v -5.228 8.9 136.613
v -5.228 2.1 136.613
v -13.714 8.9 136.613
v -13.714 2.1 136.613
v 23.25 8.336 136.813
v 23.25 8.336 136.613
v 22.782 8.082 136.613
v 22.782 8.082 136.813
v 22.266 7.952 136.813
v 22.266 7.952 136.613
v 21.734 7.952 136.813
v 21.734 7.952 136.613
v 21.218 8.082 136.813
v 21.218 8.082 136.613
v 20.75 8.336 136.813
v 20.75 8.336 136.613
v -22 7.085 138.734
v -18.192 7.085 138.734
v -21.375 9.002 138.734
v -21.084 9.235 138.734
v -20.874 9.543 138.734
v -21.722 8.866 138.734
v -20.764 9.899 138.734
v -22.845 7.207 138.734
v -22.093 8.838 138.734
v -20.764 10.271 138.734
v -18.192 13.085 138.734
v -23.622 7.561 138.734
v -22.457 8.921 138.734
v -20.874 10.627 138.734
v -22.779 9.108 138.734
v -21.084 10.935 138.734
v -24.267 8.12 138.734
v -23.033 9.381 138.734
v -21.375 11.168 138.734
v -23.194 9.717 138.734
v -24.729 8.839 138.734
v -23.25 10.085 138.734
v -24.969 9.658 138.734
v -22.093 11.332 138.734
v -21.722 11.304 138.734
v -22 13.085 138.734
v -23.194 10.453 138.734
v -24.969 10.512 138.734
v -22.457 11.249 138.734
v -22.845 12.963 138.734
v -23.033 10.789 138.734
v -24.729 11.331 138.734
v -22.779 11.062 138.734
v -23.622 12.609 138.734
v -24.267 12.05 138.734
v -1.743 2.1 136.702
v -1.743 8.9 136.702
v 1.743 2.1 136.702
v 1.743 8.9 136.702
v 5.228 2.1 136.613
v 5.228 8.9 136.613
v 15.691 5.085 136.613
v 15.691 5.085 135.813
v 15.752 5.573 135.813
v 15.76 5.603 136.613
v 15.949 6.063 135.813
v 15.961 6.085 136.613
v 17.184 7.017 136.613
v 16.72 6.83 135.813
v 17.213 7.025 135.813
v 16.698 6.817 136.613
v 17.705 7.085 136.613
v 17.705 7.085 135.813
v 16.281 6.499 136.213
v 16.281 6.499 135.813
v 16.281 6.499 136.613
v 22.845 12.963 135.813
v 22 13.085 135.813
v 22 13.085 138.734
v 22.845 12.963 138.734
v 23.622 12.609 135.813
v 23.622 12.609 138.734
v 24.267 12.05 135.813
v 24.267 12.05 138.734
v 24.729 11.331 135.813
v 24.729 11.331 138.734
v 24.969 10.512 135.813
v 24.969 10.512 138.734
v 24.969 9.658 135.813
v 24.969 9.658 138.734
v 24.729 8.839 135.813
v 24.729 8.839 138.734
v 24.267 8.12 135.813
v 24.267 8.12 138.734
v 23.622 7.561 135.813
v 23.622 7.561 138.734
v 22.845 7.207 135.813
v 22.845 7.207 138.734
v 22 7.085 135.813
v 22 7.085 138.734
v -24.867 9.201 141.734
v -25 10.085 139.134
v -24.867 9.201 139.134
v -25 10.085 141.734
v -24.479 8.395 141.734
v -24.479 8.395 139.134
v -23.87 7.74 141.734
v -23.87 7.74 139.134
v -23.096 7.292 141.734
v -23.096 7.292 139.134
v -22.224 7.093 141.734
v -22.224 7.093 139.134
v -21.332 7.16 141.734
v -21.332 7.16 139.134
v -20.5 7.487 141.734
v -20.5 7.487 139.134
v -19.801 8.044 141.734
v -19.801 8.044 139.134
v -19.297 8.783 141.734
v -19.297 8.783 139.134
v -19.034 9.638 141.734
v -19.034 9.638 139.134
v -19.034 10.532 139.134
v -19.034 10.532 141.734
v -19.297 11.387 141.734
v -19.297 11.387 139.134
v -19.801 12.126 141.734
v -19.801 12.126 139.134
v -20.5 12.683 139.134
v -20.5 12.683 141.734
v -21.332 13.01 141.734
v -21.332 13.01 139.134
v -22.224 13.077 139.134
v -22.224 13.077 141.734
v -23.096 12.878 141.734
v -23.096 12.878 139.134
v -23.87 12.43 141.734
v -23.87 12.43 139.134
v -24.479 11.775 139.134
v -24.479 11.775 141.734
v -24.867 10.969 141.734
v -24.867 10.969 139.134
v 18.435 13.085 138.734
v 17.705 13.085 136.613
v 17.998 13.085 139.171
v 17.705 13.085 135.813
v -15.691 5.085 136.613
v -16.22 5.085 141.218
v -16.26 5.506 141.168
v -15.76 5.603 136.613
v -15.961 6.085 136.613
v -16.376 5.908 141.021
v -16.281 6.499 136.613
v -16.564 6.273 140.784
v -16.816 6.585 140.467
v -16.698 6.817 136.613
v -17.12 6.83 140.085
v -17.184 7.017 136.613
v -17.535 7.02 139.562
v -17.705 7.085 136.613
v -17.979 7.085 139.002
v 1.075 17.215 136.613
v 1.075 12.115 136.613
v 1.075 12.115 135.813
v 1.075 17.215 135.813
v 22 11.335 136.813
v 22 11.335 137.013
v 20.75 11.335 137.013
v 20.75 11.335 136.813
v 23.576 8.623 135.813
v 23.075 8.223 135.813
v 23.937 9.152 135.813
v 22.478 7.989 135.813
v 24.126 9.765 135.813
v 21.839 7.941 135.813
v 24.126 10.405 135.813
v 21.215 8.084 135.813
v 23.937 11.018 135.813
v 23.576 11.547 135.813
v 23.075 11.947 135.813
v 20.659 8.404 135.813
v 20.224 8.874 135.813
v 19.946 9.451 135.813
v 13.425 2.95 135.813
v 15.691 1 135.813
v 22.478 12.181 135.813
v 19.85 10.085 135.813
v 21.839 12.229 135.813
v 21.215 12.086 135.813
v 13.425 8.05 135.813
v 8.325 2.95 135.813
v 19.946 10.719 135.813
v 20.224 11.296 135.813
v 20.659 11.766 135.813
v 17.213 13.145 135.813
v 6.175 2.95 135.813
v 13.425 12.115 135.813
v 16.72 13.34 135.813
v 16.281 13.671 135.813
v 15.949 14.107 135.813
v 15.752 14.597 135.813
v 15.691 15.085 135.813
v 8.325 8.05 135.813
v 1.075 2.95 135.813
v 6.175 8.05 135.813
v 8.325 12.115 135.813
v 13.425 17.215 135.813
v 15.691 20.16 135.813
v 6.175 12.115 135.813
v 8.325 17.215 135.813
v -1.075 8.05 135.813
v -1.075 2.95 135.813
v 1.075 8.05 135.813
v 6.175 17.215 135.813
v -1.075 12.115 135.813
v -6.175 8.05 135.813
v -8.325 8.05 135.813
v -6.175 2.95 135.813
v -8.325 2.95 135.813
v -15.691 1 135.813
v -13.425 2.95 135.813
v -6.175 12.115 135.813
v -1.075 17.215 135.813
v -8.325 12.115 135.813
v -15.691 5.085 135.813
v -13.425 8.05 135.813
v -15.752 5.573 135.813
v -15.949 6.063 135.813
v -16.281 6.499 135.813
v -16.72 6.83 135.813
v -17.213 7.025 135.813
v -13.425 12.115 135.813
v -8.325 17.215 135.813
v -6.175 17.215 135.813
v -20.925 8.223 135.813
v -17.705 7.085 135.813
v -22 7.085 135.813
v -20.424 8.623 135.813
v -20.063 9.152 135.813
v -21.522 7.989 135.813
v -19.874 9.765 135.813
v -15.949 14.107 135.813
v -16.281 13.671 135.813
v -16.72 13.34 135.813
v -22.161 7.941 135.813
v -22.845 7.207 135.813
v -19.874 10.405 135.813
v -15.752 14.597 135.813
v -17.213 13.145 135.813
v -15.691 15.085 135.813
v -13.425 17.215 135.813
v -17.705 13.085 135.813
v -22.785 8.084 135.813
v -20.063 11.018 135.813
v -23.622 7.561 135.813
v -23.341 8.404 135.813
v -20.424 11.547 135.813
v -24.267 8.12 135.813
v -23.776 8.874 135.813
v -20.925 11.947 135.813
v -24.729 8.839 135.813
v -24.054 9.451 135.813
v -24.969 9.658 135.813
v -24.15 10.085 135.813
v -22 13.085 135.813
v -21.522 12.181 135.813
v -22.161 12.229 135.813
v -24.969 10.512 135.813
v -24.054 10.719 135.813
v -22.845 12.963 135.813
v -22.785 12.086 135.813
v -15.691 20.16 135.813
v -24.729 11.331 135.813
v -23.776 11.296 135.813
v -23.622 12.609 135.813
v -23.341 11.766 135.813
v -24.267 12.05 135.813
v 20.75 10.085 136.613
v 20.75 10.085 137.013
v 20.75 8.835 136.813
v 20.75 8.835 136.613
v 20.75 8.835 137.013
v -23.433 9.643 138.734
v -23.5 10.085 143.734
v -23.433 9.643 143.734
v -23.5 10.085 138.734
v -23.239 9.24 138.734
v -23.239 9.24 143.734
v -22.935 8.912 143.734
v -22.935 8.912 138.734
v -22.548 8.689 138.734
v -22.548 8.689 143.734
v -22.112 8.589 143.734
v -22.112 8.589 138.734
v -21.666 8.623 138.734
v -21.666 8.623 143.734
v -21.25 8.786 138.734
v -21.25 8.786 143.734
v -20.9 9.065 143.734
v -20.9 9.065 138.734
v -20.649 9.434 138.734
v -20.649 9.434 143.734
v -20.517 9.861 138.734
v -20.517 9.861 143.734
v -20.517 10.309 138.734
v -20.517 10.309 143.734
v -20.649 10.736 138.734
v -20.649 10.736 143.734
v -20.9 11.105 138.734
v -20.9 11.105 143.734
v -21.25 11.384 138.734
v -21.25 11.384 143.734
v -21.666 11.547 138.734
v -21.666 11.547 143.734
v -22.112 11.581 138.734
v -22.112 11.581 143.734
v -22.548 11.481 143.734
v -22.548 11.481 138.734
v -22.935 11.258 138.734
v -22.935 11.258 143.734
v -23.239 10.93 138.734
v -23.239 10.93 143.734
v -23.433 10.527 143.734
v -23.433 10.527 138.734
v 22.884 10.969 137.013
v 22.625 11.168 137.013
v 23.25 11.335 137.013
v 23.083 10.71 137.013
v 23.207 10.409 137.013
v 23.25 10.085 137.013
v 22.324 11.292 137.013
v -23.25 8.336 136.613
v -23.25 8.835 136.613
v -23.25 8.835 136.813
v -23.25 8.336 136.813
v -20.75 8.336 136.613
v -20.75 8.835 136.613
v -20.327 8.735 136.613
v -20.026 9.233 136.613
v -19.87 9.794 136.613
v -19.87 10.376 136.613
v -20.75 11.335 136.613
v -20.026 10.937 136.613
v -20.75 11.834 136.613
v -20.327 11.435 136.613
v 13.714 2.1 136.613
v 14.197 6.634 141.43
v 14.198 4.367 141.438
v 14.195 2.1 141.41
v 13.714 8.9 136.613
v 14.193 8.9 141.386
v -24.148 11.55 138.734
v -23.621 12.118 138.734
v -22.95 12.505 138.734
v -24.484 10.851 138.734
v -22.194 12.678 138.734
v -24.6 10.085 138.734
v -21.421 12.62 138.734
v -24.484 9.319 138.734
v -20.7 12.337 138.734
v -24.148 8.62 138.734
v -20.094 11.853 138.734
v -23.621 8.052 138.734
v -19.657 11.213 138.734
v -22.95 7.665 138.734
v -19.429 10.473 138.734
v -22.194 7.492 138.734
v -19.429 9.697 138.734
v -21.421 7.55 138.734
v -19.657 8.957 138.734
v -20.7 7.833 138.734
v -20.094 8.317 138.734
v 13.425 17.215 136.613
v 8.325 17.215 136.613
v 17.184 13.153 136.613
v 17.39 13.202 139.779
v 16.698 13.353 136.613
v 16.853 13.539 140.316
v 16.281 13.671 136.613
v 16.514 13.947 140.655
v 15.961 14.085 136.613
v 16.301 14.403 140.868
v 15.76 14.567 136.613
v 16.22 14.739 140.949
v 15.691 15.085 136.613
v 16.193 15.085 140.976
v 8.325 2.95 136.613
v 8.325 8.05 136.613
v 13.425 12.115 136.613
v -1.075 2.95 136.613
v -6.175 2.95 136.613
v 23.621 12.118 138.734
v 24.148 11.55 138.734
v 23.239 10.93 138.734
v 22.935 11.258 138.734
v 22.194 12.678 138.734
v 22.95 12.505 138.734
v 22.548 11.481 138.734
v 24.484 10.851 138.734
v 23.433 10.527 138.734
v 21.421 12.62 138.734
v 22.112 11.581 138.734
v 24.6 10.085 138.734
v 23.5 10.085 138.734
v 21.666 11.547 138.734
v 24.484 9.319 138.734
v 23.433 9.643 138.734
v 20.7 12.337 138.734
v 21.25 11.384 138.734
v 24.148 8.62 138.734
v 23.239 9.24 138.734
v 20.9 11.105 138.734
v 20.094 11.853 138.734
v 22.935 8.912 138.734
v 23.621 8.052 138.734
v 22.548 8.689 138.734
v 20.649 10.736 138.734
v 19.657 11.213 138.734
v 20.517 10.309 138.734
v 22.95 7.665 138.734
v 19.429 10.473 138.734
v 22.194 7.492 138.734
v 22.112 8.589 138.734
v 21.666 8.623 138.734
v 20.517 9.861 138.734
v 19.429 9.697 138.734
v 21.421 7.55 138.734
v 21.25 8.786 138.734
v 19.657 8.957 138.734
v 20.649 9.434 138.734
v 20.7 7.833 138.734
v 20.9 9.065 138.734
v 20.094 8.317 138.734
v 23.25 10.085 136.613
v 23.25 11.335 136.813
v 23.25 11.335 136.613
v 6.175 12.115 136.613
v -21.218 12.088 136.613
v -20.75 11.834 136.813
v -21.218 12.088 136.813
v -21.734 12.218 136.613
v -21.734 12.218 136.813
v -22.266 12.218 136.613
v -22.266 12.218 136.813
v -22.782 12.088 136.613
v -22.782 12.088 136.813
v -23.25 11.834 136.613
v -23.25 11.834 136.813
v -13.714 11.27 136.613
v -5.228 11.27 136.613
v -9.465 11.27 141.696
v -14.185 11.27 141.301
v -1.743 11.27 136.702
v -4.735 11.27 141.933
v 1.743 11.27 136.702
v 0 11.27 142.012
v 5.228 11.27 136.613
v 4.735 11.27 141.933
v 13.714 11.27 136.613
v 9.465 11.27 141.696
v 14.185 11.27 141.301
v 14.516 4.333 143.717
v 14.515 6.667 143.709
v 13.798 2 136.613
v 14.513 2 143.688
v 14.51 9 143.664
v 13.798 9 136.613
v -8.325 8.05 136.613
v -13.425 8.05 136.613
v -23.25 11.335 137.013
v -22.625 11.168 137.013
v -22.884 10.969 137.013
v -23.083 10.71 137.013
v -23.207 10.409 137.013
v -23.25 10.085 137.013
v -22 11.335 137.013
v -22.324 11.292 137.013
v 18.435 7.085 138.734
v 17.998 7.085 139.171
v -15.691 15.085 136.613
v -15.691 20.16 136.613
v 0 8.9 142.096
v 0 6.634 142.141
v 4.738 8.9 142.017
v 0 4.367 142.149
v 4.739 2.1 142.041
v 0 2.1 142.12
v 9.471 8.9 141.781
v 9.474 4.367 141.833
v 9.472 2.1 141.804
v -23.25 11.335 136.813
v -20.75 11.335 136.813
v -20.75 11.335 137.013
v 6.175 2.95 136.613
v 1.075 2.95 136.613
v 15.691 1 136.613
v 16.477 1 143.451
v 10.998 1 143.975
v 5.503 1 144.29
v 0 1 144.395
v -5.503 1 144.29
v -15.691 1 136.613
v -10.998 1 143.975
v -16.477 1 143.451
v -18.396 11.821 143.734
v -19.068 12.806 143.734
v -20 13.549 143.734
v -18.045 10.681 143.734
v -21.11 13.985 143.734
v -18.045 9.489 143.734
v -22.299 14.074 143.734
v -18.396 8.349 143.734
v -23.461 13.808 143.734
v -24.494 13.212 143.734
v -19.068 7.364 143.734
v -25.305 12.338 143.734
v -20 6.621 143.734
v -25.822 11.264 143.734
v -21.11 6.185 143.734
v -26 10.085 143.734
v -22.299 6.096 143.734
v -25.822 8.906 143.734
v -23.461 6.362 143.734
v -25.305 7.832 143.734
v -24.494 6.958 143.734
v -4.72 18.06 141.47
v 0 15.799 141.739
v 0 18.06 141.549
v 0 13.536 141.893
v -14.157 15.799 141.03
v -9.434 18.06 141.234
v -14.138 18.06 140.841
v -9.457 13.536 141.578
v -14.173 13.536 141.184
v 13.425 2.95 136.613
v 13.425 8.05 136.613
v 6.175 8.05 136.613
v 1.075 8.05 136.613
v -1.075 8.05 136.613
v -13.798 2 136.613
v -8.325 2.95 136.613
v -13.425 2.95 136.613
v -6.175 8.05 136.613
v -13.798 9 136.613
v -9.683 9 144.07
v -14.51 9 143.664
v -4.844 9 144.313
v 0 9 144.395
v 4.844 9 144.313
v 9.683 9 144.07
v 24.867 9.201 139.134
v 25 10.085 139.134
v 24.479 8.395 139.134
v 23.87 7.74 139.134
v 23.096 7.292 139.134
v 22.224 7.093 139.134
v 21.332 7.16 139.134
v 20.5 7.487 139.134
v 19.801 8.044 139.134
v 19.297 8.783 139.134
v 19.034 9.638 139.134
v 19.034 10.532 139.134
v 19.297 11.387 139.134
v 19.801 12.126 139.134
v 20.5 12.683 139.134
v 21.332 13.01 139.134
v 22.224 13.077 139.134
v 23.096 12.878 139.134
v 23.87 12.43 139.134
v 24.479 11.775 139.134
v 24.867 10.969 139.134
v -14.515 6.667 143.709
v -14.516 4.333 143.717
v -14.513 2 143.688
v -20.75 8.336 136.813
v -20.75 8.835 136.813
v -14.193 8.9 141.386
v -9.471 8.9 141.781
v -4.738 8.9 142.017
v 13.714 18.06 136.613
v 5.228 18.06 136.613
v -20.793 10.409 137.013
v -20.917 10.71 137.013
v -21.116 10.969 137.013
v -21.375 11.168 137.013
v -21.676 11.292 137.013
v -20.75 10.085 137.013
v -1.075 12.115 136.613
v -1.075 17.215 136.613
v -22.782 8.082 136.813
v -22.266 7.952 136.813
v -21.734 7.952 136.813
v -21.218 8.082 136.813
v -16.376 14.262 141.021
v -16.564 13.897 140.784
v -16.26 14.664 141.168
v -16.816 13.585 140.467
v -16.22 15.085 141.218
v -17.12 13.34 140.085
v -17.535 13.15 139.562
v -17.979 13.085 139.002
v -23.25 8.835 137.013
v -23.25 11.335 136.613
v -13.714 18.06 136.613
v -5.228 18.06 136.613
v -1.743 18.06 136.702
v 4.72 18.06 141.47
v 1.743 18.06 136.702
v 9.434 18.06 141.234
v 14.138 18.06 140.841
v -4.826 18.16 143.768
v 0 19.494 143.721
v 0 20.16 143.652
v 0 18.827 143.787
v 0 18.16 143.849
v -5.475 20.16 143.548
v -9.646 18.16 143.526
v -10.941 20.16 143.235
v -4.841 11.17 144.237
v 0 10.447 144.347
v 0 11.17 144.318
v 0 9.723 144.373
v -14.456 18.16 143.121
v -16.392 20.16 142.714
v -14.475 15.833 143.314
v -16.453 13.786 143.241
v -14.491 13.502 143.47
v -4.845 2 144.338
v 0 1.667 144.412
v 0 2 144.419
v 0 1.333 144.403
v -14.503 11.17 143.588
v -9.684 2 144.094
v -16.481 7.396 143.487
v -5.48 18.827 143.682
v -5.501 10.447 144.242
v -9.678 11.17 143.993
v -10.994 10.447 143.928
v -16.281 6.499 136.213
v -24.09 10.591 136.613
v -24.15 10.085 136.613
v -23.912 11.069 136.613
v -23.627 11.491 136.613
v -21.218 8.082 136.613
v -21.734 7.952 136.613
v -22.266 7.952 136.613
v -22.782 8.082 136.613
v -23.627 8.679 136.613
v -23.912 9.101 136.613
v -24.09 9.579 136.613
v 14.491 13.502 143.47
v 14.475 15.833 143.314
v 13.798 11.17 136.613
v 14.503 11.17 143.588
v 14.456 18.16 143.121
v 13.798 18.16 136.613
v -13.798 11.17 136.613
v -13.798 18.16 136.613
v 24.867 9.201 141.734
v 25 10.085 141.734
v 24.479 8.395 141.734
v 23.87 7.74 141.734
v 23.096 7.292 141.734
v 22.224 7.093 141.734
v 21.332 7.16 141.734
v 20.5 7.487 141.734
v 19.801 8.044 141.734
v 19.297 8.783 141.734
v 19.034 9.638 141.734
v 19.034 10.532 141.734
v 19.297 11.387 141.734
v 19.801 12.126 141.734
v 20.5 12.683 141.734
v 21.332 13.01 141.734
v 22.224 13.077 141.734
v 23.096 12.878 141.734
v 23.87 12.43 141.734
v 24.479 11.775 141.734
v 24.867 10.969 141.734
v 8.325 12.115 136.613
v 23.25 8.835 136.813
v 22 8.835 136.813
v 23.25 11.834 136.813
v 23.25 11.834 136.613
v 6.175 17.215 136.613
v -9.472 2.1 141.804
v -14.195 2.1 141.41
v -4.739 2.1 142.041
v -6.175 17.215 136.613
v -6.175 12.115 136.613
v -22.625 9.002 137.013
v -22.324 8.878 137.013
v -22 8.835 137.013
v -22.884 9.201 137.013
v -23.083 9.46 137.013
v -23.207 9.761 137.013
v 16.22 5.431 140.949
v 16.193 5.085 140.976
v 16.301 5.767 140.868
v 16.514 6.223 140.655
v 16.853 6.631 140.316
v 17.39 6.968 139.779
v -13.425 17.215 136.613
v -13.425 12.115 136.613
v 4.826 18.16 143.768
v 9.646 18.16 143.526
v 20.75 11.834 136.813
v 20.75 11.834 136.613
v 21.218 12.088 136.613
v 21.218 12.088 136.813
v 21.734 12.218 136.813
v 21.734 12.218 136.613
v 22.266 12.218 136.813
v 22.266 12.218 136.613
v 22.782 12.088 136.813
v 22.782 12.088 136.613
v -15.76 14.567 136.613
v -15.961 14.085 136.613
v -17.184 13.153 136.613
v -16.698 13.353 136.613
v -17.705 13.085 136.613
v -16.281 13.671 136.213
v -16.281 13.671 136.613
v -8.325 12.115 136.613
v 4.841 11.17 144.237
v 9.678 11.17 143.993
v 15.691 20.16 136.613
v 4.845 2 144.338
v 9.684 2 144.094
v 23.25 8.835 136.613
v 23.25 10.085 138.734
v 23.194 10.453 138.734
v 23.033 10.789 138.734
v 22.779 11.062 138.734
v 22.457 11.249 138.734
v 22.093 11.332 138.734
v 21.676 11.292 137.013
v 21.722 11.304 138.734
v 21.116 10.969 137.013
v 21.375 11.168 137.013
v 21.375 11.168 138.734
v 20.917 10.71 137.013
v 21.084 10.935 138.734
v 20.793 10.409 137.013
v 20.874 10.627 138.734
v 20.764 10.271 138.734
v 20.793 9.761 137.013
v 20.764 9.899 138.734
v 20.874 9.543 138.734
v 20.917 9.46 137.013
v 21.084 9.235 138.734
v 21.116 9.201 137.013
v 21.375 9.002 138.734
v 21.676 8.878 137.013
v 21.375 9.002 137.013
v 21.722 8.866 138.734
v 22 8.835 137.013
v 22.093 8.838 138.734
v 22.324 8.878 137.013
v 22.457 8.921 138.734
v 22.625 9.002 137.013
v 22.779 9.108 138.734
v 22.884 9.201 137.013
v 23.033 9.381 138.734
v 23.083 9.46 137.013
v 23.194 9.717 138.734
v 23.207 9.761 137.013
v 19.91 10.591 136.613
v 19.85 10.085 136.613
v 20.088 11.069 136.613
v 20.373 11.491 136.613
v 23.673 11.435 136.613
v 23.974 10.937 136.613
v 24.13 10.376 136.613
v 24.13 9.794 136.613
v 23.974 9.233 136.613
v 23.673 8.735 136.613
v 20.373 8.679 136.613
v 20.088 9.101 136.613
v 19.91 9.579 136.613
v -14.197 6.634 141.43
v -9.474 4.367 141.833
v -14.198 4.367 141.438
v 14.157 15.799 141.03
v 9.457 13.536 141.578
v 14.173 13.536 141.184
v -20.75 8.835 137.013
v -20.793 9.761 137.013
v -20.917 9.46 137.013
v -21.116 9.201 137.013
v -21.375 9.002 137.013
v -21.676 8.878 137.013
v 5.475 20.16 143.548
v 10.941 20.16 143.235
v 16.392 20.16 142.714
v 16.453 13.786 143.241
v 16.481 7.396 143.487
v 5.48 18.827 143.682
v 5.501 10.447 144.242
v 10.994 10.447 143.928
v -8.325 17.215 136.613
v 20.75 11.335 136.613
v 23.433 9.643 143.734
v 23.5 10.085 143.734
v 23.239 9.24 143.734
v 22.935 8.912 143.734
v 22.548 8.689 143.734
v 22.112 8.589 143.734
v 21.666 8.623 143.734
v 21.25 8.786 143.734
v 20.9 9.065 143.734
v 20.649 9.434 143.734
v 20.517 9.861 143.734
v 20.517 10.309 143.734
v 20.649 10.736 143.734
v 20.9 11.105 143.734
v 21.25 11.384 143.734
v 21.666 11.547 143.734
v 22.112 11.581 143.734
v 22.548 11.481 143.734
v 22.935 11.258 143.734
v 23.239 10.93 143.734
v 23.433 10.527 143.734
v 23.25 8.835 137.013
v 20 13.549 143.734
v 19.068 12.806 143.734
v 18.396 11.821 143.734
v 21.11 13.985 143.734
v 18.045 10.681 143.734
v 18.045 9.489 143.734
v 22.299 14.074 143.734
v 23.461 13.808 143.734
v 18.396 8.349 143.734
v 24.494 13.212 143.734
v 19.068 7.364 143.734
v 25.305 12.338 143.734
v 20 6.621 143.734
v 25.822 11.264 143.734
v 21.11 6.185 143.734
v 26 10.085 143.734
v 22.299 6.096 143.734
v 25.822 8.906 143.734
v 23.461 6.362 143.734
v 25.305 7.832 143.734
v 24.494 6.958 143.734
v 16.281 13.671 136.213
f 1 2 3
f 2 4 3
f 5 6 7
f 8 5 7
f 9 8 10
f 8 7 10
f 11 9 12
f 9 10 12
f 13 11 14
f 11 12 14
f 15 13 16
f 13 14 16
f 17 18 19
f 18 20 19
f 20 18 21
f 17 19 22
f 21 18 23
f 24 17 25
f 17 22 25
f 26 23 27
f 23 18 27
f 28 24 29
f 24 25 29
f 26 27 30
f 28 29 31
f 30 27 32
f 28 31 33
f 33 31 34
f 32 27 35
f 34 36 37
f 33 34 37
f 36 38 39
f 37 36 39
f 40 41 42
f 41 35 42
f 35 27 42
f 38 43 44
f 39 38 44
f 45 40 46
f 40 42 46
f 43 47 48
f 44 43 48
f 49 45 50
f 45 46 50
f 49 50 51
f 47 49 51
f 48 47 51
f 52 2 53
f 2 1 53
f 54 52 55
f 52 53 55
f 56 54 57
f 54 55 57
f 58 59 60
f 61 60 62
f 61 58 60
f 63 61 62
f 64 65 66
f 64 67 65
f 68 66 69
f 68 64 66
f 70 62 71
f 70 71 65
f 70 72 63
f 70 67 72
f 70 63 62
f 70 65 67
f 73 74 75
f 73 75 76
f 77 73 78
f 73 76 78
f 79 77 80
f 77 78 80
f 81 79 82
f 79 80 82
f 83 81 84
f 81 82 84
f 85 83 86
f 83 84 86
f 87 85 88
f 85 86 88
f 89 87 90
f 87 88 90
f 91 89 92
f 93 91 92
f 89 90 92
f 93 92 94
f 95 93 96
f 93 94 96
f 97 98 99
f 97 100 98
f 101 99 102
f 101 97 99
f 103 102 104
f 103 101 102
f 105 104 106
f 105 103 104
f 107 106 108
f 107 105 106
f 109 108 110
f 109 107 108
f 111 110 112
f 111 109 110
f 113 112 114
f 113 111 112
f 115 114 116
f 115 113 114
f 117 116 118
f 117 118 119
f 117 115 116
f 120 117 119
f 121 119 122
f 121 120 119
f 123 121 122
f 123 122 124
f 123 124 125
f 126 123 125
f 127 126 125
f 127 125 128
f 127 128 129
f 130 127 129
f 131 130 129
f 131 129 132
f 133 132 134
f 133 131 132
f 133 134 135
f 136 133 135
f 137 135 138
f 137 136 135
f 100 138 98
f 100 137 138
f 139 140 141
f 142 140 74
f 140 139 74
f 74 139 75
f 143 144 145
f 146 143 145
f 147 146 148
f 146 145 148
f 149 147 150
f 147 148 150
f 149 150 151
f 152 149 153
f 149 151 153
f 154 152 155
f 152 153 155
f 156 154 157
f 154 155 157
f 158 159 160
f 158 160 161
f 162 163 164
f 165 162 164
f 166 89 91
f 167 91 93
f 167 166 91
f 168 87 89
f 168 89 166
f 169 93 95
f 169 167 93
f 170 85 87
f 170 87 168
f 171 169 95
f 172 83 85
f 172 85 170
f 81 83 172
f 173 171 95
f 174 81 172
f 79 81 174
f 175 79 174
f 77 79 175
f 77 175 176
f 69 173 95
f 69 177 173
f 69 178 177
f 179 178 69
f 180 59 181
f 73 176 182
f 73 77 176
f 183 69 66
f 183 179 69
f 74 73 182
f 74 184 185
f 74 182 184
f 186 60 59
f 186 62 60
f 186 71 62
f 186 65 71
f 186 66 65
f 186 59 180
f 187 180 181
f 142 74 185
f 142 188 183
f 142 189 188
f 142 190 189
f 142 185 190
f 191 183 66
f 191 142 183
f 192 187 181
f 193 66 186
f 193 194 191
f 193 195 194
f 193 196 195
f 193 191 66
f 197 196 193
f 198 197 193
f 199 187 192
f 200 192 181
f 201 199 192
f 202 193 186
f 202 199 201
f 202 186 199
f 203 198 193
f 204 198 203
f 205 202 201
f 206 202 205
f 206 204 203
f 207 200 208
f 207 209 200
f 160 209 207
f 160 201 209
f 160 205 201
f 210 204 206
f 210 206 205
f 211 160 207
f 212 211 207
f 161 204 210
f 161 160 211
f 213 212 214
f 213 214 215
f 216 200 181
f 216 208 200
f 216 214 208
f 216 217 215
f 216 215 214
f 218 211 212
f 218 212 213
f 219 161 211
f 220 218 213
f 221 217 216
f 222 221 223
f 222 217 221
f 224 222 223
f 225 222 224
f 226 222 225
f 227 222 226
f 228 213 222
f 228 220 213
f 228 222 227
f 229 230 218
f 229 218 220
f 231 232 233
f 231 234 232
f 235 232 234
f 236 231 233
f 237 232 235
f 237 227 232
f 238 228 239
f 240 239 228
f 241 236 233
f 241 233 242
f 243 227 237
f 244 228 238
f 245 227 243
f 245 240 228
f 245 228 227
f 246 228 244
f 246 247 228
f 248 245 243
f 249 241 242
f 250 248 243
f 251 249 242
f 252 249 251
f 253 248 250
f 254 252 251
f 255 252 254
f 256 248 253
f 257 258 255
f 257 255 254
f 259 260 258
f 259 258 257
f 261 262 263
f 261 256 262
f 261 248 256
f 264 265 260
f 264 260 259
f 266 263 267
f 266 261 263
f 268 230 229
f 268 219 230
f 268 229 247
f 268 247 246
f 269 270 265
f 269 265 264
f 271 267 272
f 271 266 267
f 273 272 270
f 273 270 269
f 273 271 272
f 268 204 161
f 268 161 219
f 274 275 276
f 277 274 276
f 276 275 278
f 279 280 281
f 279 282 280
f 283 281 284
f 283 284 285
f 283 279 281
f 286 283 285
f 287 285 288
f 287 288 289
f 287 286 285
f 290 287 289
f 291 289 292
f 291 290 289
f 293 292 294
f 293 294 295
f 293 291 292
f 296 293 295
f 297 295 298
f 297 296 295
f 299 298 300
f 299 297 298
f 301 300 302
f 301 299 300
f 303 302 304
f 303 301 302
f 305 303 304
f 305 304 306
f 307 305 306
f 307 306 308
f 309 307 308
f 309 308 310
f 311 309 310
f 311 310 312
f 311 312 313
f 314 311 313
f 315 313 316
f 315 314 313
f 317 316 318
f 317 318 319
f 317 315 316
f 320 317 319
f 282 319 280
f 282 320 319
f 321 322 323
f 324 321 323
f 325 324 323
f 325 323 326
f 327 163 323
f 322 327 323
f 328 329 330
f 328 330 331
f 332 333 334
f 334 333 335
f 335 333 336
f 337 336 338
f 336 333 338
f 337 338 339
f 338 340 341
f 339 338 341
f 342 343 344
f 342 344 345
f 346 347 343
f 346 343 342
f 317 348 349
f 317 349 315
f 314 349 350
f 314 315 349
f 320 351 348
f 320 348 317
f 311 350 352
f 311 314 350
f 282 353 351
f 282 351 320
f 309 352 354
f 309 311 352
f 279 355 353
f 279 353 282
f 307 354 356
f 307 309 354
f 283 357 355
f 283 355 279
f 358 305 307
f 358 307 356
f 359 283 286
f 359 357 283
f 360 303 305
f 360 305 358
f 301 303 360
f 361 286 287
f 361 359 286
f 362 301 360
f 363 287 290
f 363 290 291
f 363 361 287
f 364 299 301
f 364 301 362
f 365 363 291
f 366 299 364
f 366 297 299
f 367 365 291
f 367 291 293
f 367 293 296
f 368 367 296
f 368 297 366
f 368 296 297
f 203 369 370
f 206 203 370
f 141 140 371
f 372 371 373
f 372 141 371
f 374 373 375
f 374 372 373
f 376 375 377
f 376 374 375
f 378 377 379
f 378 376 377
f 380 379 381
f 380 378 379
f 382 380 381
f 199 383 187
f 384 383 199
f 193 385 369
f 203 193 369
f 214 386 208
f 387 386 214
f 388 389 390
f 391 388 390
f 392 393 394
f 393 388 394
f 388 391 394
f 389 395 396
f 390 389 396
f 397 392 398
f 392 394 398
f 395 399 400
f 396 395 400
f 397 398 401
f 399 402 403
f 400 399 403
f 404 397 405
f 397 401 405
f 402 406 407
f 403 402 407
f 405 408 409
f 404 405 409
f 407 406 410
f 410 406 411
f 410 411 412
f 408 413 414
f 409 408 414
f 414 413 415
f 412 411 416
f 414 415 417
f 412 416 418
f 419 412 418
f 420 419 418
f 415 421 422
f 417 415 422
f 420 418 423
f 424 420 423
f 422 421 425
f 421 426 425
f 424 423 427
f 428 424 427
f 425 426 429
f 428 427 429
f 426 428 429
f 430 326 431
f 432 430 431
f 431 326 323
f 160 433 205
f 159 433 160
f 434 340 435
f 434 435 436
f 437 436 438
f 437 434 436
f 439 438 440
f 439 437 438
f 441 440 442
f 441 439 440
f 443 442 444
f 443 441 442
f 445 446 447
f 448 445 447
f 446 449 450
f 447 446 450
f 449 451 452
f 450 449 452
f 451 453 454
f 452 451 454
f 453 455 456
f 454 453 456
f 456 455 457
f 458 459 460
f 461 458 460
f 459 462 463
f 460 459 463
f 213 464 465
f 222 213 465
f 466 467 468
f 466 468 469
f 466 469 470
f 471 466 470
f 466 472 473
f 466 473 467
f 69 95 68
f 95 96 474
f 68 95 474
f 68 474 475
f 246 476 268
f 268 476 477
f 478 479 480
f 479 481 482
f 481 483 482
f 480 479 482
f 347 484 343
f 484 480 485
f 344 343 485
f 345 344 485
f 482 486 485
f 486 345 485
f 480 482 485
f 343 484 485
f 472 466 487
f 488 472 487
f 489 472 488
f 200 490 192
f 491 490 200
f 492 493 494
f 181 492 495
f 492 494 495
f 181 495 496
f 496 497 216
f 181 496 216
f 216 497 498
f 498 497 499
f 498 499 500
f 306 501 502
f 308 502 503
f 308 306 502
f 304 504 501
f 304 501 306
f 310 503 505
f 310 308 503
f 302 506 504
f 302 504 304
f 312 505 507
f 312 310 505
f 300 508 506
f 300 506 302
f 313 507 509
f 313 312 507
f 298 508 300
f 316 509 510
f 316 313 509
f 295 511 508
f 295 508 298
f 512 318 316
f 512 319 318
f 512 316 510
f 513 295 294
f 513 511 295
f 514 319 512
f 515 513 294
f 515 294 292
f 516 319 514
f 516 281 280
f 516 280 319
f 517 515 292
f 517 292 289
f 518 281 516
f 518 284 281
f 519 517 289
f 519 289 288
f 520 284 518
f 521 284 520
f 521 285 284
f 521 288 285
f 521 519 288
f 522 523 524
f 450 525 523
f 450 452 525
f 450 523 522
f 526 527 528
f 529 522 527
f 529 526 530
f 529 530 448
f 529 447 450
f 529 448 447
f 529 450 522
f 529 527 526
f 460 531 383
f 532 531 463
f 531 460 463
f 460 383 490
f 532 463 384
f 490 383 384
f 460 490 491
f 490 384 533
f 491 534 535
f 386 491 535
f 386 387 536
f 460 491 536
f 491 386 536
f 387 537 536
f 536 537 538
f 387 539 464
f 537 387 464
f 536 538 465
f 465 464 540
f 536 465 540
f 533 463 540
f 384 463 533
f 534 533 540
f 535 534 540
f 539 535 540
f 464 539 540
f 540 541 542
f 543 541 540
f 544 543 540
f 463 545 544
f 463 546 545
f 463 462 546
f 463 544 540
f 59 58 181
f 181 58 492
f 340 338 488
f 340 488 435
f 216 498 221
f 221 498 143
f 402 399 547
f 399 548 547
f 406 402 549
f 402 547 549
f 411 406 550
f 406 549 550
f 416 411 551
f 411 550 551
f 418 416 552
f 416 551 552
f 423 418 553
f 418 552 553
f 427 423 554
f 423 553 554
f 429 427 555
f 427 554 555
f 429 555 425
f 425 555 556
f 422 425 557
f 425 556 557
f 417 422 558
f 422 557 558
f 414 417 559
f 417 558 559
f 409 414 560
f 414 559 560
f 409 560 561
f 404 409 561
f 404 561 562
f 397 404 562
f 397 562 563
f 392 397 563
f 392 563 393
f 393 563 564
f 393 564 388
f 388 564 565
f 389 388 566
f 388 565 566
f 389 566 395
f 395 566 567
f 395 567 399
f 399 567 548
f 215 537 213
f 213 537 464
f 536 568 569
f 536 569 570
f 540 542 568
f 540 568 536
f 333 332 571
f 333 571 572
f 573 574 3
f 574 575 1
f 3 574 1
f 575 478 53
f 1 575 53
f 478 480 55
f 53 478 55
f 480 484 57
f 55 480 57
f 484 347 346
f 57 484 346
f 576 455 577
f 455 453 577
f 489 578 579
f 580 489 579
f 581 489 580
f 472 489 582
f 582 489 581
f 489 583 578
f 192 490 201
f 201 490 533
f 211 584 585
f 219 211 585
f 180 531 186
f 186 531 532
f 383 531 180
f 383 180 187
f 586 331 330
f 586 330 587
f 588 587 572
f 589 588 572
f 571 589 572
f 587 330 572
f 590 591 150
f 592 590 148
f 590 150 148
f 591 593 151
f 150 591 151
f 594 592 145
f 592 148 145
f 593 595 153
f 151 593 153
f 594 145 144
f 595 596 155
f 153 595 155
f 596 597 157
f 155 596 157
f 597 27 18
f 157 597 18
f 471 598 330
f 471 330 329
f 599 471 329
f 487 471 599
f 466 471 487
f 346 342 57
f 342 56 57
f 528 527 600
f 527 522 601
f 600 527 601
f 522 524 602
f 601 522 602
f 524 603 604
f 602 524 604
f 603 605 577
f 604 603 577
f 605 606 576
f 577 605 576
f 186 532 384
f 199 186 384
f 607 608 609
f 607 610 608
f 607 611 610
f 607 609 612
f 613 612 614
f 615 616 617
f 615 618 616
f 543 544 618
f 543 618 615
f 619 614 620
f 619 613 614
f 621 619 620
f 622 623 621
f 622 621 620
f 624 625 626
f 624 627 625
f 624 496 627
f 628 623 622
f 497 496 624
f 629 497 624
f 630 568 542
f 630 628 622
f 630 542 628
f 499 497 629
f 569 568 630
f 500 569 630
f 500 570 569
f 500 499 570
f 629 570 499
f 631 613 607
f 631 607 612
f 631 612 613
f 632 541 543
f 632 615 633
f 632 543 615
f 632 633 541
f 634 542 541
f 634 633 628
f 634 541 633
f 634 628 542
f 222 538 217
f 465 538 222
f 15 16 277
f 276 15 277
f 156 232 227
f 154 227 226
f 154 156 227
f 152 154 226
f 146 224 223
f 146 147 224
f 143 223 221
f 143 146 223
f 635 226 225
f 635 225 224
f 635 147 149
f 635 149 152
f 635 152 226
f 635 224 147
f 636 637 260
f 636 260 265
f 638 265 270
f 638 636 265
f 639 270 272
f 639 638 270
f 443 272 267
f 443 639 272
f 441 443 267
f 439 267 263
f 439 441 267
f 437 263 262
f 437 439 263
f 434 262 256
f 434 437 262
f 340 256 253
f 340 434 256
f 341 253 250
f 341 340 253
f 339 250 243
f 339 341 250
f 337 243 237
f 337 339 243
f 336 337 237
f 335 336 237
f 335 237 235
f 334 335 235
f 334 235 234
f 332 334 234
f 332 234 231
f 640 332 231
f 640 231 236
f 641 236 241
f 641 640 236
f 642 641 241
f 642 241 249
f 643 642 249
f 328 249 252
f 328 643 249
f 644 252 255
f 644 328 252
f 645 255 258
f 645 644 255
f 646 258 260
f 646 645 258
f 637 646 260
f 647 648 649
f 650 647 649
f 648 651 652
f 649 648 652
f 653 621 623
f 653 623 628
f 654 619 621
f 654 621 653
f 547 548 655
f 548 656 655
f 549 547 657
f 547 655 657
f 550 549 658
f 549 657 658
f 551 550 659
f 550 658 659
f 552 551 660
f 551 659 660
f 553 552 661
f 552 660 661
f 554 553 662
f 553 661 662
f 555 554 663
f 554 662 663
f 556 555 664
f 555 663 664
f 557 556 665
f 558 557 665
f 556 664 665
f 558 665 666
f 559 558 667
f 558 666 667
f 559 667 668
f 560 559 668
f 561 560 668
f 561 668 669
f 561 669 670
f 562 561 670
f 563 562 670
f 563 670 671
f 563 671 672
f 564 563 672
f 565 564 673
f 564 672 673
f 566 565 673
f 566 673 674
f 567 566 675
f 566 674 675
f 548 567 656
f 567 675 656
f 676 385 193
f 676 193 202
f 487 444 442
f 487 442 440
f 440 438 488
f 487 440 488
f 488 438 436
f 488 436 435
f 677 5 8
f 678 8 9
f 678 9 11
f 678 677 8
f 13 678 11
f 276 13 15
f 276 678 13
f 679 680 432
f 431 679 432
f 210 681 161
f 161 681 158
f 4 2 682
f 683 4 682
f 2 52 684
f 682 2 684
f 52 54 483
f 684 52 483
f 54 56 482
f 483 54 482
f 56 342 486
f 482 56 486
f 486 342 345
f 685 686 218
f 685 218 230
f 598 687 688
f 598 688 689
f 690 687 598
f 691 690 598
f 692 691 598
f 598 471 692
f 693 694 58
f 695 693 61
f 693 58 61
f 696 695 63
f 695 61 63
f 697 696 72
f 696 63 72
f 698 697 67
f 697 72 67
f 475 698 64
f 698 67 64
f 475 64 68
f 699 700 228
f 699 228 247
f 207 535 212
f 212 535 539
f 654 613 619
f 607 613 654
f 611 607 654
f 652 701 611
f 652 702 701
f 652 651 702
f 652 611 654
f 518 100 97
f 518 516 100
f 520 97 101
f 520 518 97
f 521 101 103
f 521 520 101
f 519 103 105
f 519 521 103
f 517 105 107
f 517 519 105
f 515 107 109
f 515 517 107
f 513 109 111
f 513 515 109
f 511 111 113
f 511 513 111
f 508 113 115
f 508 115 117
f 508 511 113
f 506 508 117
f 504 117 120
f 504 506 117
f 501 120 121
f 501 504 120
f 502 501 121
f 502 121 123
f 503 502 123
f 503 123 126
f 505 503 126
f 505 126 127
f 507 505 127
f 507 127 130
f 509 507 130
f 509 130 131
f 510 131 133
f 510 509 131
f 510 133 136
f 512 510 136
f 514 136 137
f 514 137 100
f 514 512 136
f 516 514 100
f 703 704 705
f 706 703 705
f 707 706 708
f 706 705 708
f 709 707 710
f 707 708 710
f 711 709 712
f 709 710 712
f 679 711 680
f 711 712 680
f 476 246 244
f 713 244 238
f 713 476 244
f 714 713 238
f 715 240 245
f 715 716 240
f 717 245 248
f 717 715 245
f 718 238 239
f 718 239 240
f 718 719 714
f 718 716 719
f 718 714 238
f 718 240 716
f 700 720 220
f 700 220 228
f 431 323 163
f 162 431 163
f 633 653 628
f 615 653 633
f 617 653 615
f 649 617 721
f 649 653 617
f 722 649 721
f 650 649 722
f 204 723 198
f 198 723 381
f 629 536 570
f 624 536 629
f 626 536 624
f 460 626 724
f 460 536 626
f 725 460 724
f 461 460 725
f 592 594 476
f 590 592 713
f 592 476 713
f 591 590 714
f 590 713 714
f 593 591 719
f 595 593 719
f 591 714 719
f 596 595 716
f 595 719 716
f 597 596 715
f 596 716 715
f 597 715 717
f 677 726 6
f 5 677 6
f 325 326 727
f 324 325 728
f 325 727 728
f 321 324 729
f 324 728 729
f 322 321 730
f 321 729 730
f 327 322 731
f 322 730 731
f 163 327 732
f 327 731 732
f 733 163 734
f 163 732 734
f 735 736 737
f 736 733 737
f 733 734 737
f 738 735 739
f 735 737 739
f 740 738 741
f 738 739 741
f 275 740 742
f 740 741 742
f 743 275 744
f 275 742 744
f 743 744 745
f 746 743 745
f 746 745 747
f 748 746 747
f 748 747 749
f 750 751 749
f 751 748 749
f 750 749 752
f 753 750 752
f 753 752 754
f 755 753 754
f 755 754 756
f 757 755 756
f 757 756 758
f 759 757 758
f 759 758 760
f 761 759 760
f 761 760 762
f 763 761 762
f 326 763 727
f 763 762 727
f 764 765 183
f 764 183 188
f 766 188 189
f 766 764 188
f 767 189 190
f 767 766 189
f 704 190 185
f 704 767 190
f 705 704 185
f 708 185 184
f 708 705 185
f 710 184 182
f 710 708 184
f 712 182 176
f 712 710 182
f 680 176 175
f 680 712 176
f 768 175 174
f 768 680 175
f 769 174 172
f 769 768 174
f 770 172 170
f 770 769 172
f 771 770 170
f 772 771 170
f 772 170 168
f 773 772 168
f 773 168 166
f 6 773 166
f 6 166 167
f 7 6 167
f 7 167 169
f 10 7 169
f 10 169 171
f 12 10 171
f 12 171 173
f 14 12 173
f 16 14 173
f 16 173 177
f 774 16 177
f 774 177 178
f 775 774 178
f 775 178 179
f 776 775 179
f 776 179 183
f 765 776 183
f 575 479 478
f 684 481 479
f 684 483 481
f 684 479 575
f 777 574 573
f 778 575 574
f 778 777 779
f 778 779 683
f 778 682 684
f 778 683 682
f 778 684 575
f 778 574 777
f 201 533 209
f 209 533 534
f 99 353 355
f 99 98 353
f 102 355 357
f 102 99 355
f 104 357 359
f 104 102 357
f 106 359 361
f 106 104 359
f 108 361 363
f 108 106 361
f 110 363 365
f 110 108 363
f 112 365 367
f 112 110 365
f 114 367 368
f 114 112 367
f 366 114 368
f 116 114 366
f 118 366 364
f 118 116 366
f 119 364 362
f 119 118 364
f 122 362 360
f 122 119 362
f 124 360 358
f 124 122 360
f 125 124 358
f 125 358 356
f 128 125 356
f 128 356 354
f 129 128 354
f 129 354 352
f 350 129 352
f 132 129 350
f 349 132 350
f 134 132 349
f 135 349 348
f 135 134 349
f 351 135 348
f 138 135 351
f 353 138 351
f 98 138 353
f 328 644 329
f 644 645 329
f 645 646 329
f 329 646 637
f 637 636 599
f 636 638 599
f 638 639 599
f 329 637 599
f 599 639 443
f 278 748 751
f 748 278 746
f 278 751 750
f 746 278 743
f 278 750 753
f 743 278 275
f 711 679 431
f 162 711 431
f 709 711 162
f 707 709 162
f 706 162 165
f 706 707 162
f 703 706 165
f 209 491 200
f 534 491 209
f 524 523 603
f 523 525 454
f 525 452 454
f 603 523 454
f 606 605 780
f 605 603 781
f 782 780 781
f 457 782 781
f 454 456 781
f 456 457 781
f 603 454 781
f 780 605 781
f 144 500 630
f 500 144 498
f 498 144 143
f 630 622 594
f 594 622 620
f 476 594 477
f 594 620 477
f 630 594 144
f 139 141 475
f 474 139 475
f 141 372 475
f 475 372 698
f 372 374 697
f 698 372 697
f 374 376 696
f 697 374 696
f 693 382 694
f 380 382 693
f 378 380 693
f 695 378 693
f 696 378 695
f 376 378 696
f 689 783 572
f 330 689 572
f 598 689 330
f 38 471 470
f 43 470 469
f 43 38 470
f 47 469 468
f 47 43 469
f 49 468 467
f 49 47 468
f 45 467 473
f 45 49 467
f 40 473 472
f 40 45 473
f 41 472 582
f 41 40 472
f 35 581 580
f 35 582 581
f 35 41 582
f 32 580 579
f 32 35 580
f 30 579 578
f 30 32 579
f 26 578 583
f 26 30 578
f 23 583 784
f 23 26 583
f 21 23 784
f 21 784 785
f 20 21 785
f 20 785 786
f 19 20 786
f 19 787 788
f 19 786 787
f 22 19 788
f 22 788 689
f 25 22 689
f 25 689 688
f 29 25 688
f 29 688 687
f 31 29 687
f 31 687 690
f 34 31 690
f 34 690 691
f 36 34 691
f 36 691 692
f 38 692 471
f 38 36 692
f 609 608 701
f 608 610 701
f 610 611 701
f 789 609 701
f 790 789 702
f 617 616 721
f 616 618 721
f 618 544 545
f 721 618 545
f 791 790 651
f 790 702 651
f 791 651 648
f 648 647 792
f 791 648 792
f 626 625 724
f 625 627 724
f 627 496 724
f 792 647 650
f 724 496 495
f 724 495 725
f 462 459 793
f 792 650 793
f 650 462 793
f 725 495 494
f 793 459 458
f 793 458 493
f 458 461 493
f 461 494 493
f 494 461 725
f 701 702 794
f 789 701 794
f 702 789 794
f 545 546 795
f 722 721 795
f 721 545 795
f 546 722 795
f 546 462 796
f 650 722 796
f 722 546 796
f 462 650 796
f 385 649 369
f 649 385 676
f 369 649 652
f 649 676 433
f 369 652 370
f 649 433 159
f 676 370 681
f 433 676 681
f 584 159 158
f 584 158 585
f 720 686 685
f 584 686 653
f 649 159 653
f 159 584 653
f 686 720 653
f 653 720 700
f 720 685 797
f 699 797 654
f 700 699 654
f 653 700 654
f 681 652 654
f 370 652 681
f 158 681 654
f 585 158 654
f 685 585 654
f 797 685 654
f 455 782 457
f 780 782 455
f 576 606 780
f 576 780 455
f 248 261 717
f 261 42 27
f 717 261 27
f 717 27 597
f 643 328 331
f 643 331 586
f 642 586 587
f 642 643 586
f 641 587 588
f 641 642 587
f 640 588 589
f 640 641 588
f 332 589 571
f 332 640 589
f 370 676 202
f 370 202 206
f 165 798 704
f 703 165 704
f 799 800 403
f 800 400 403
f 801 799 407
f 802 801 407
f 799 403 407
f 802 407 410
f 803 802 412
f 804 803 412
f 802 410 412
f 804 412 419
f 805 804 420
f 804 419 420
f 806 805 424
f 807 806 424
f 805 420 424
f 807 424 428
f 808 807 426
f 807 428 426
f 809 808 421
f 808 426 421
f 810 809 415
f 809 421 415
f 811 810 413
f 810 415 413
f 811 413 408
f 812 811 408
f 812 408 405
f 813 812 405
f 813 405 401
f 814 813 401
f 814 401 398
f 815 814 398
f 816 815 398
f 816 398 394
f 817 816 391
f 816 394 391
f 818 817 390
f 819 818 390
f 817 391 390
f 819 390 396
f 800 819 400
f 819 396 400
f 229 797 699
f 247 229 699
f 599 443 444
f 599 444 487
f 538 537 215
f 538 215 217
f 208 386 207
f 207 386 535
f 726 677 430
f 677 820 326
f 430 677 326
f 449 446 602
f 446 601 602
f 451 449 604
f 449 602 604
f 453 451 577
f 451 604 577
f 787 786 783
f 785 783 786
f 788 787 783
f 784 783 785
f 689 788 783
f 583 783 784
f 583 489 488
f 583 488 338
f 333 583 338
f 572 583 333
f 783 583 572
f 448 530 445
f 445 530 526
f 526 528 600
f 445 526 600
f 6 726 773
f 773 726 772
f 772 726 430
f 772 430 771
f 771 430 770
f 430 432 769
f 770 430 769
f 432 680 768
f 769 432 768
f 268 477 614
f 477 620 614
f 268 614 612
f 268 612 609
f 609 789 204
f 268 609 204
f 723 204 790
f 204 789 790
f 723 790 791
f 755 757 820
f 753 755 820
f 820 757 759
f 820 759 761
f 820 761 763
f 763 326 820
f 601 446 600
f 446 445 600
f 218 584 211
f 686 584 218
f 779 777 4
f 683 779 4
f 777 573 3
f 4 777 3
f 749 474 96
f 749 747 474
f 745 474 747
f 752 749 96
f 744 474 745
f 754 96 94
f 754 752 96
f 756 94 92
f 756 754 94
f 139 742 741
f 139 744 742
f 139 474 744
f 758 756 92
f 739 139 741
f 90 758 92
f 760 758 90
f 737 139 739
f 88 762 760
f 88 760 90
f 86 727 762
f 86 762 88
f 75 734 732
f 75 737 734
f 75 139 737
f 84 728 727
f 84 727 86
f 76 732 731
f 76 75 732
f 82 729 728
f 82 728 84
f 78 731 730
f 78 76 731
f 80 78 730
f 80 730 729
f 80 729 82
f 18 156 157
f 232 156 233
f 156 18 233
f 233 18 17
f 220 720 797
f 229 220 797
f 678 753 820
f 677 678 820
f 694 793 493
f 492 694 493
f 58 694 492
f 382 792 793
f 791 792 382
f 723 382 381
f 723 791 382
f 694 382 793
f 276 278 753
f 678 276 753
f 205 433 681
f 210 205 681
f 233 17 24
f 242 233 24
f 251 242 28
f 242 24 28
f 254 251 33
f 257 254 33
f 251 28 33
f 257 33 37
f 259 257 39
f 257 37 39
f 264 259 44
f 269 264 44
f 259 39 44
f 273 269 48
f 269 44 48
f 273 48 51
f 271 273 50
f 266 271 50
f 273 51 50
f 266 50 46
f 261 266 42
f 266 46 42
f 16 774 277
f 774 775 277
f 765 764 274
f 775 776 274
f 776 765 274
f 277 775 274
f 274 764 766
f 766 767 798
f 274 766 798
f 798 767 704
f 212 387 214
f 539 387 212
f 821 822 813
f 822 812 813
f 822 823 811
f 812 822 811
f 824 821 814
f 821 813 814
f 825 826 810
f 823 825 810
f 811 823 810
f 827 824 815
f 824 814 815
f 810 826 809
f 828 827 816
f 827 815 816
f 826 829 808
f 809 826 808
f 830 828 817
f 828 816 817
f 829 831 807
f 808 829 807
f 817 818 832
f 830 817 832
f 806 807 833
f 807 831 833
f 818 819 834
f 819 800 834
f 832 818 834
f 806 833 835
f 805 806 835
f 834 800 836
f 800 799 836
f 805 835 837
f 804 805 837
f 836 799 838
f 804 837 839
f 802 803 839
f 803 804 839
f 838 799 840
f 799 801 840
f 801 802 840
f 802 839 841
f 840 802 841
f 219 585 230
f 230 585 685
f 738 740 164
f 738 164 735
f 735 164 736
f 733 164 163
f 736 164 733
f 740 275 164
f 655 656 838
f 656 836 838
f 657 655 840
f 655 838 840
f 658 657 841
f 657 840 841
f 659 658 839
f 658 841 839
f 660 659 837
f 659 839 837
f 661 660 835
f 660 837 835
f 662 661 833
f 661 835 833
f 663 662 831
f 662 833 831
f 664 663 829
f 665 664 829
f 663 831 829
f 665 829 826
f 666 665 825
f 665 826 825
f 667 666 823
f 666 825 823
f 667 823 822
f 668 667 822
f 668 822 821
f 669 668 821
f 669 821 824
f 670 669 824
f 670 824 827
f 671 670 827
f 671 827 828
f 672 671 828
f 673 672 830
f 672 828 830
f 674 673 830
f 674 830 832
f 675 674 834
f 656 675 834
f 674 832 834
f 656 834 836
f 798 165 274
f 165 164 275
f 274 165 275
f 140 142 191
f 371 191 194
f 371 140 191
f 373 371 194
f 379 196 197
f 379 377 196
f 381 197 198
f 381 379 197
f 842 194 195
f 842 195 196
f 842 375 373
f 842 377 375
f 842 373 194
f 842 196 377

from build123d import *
from OCP.BRepFilletAPI import BRepFilletAPI_MakeChamfer

# Parameters (mm, degrees)
REVOLVE1_ANGLE          = 13.104621076
CUT_REVOLVE1_ANGLE      = 11.534873692
REVOLVE4_ANGLE          = 11.464873692
CUT_EXTRUDE2_START      = -15.691444559
CUT_EXTRUDE2_OUTLINE_W  = 22.613004813
CUT_EXTRUDE2_OUTLINE_H  = 19.16
CUT_EXTRUDE2_DEPTH      = 31.382889118
BOSS_EXTRUDE3_OUTLINE_R = 1.25
BOSS_EXTRUDE3_DEPTH     = 2.120878311
FILLET1_R               = 2
CHAMFER2_SIZE           = 2.5
CHAMFER2_SIZE2          = 2.257176605
SKETCH11_R              = 2.15
BOSS_EXTRUDE4_DEPTH     = 0.8
CUT_EXTRUDE5_START      = -0.4
CUT_EXTRUDE5_DEPTH      = 0.4
CUT_EXTRUDE6_START      = 136.613004813
CUT_EXTRUDE6_DEPTH      = 0.2
SKETCH13_W              = 5.1
SKETCH13_H              = 5.1
CUT_EXTRUDE7_DEPTH      = 0.8


# Read off the part's stored shape, not the designer's step: Cut-Extrude2, Boss-Extrude3, Cut-Extrude6
with BuildPart() as part:
    # Sketch2 → Revolve1 (revolve, symmetric)
    with BuildSketch(Plane(origin=(0, 0, 0), x_dir=(0, 0, -1), z_dir=(1, 0, 0))) as revolve1_sk:
        with BuildLine():
            Line((-144.394606894, 1), (-116.613004813, 1))
            Line((-116.613004813, 1), (-116.613004813, 20.16))
            Line((-116.613004813, 20.16), (-143.65227774, 20.16))
            ThreePointArc((-143.65227774, 20.16), (-144.341706852, 10.592330743), (-144.394606894, 1))
        make_face()
    revolve(axis=Axis((0, 110.183531328, 0), (0, -1, 0)), revolution_arc=REVOLVE1_ANGLE / 2)
    revolve(revolve1_sk.sketch, axis=Axis((0, 110.183531328, 0), (0, 1, 0)), revolution_arc=REVOLVE1_ANGLE / 2)

    # Sketch2<3> → Cut-Revolve1 (revolve, symmetric, cut)
    with BuildSketch(Plane(origin=(0, 0, 0), x_dir=(0, 0, -1), z_dir=(1, 0, 0))) as cut_revolve1_sk:
        with BuildLine():
            ThreePointArc((-143.849285365, 18.16), (-144.126109058, 14.667842971), (-144.318167948, 11.17))
            Line((-144.318167948, 11.17), (-137.31303574, 11.17))
            ThreePointArc((-137.31303574, 11.17), (-137.111143693, 14.668141466), (-136.820148677, 18.16))
            Line((-136.820148677, 18.16), (-143.849285365, 18.16))
        make_face()
        with BuildLine():
            ThreePointArc((-144.394606894, 9), (-144.449134138, 5.500146838), (-144.418843992, 2))
            Line((-144.418843992, 2), (-137.418843992, 2))
            ThreePointArc((-137.418843992, 2), (-137.450676688, 5.500162179), (-137.393372053, 9))
            Line((-137.393372053, 9), (-144.394606894, 9))
        make_face()
        with BuildLine():
            ThreePointArc((-136.820148677, 18.16), (-137.111143693, 14.668141466), (-137.31303574, 11.17))
            Line((-137.31303574, 11.17), (-136.613004813, 11.17))
            Line((-136.613004813, 11.17), (-136.613004813, 18.16))
            Line((-136.613004813, 18.16), (-136.820148677, 18.16))
        make_face()
        with BuildLine():
            ThreePointArc((-137.393372053, 9), (-137.450676688, 5.500162179), (-137.418843992, 2))
            Line((-137.418843992, 2), (-136.613004813, 2))
            Line((-136.613004813, 2), (-136.613004813, 9))
            Line((-136.613004813, 9), (-137.393372053, 9))
        make_face()
    revolve(axis=Axis((0, 110.183531328, 0), (0, -1, 0)), revolution_arc=CUT_REVOLVE1_ANGLE / 2, mode=Mode.SUBTRACT)
    revolve(cut_revolve1_sk.sketch, axis=Axis((0, 110.183531328, 0), (0, 1, 0)), revolution_arc=CUT_REVOLVE1_ANGLE / 2, mode=Mode.SUBTRACT)


with BuildPart() as body_2:
    # Sketch10 → Revolve4 (revolve, symmetric)
    with BuildSketch(Plane(origin=(0, 0, 0), x_dir=(0, 0, -1), z_dir=(1, 0, 0))) as revolve4_sk:
        with BuildLine():
            Line((-136.713004813, 18.06), (-141.548786289, 18.06))
            ThreePointArc((-141.548786289, 18.06), (-141.820861348, 14.667770498), (-142.011653043, 11.27))
            Line((-142.011653043, 11.27), (-136.713004813, 11.27))
            Line((-136.713004813, 11.27), (-136.713004813, 18.06))
        make_face()
        with BuildLine():
            Line((-136.713004813, 8.9), (-142.096490104, 8.9))
            ThreePointArc((-142.096490104, 8.9), (-142.149120141, 5.500143086), (-142.120415493, 2.1))
            Line((-142.120415493, 2.1), (-136.713004813, 2.1))
            Line((-136.713004813, 2.1), (-136.713004813, 8.9))
        make_face()
    revolve(axis=Axis((0, 90.486530569, 0), (0, -1, 0)), revolution_arc=REVOLVE4_ANGLE / 2)
    revolve(revolve4_sk.sketch, axis=Axis((0, 90.486530569, 0), (0, 1, 0)), revolution_arc=REVOLVE4_ANGLE / 2)


with BuildPart() as cut_extrude2_tool:
    # Cut-Extrude2 outline → Cut-Extrude2 (new body)
    with BuildSketch(Plane(origin=(0, 0, 0), x_dir=(0, 0, -1), z_dir=(1, 0, 0)).offset(CUT_EXTRUDE2_START)):
        with Locations((-125.306502407, 10.58)):
            Rectangle(CUT_EXTRUDE2_OUTLINE_W, CUT_EXTRUDE2_OUTLINE_H)
    extrude(amount=CUT_EXTRUDE2_DEPTH)


with BuildPart() as part_1:
    add(part.part)

    # Cut-Extrude2: cut by cut_extrude2_tool
    add(cut_extrude2_tool.part, mode=Mode.SUBTRACT)

    # Boss-Extrude3 outline → Boss-Extrude3 (add)
    with BuildSketch(Plane(origin=(0, 0, 138.733883125), x_dir=(-1, 0, 0), z_dir=(0, 0, -1))):
        with BuildLine():
            Line((22, 13.085), (15.691444559, 13.085))
            Line((15.691444559, 13.085), (15.691444559, 7.085))
            Line((15.691444559, 7.085), (22, 7.085))
            ThreePointArc((22, 7.085), (25, 10.085), (22, 13.085))
        make_face()
        with Locations((22, 10.085)):
            Circle(BOSS_EXTRUDE3_OUTLINE_R, mode=Mode.SUBTRACT)
    boss_extrude3 = extrude(amount=BOSS_EXTRUDE3_DEPTH)

    # Mirror7: Boss-Extrude3 across plane
    add(boss_extrude3.mirror(Plane(origin=(0, 0, 0), x_dir=(0, 0, 1), z_dir=(1, 0, 0))))

    # Fillet1
    fillet1_edges = [part_1.edges().sort_by_distance(p)[0] for p in [
        (-15.813247182, 13.085, 137.673443969),
        (-15.813247182, 7.085, 137.673443969),
        (15.813247182, 13.085, 137.673443969),
        (15.813247182, 7.085, 137.673443969),
    ]]
    fillet(fillet1_edges, radius=FILLET1_R)

    # Chamfer2: one chamfer whose edges measure the first distance from different faces: ONE call of the kernel's chamfer builder (chamfer() names one face for all edges)
    chamfer2_edges_1 = [part_1.edges().sort_by_distance(p)[0] for p in [
        (-15.935049804, 10.085, 138.733883125),
    ]]
    chamfer2_side_1 = [part_1.faces().sort_by_distance(p)[0] for p in [
        (-16.127692214, 10.467235717, 140.411068316),
    ]]
    chamfer2_edges_2 = [part_1.edges().sort_by_distance(p)[0] for p in [
        (15.935049804, 10.085, 138.733883125),
    ]]
    chamfer2_side_2 = [part_1.faces().sort_by_distance(p)[0] for p in [
        (19.844503511, 10.085, 138.733883125),
    ]]
    chamfer2 = BRepFilletAPI_MakeChamfer(part_1.part.solid().wrapped)
    for e in chamfer2_edges_1:
        chamfer2.Add(CHAMFER2_SIZE, CHAMFER2_SIZE2, e.wrapped, chamfer2_side_1[0].wrapped)  # the first distance lies on this face
    for e in chamfer2_edges_2:
        chamfer2.Add(CHAMFER2_SIZE, CHAMFER2_SIZE2, e.wrapped, chamfer2_side_2[0].wrapped)  # the first distance lies on this face
    add(Compound.cast(chamfer2.Shape()), mode=Mode.REPLACE)

    # Sketch11 → Boss-Extrude4 (add)
    with BuildSketch(Plane(origin=(0, 0, 136.613004813), x_dir=(-1, 0, 0), z_dir=(0, 0, -1))):
        with BuildLine():
            Line((15.691444559, 20.16), (-15.691444559, 20.16))
            Line((-15.691444559, 20.16), (-15.691444559, 15.085))
            add(Edge.make_bspline(
                [(-17.704594276, 13.085), (-15.691444559, 13.085), (-15.691444559, 15.085)],
                knots=[4.71238898, 4.71238898, 4.71238898, 6.283185307, 6.283185307, 6.283185307], degree=2, weights=[1, 0.707106781, 1]))
            Line((-17.704594276, 13.085), (-22, 13.085))
            ThreePointArc((-22, 13.085), (-25, 10.085), (-22, 7.085))
            Line((-22, 7.085), (-17.704594276, 7.085))
            add(Edge.make_bspline(
                [(-15.691444559, 5.085), (-15.691444559, 7.085), (-17.704594276, 7.085)],
                knots=[3.141592654, 3.141592654, 3.141592654, 4.71238898, 4.71238898, 4.71238898], degree=2, weights=[1, 0.707106781, 1]))
            Line((-15.691444559, 5.085), (-15.691444559, 1))
            Line((-15.691444559, 1), (15.691444559, 1))
            Line((15.691444559, 1), (15.691444559, 5.085))
            add(Edge.make_bspline(
                [(17.704594276, 7.085), (15.691444559, 7.085), (15.691444559, 5.085)],
                knots=[4.71238898, 4.71238898, 4.71238898, 6.283185307, 6.283185307, 6.283185307], degree=2, weights=[1, 0.707106781, 1]))
            Line((17.704594276, 7.085), (22, 7.085))
            ThreePointArc((22, 7.085), (25, 10.085), (22, 13.085))
            Line((22, 13.085), (17.704594276, 13.085))
            add(Edge.make_bspline(
                [(15.691444559, 15.085), (15.691444559, 13.085), (17.704594276, 13.085)],
                knots=[3.141592654, 3.141592654, 3.141592654, 4.71238898, 4.71238898, 4.71238898], degree=2, weights=[1, 0.707106781, 1]))
            Line((15.691444559, 15.085), (15.691444559, 20.16))
        make_face()
        with Locations((-22, 10.085)):
            Circle(SKETCH11_R, mode=Mode.SUBTRACT)
        with Locations((22, 10.085)):
            Circle(SKETCH11_R, mode=Mode.SUBTRACT)
    extrude(amount=BOSS_EXTRUDE4_DEPTH)

    # Sketch12 → Cut-Extrude5 (cut)
    with BuildSketch(Plane(origin=(0, 0, 136.613004813), x_dir=(-1, 0, 0), z_dir=(0, 0, -1)).offset(CUT_EXTRUDE5_START)):
        with BuildLine():
            ThreePointArc((20.75, 10.085), (21.116116524, 10.968883476), (22, 11.335))
            Line((22, 11.335), (20.75, 11.335))
            Line((20.75, 11.335), (20.75, 10.085))
        make_face()
        with BuildLine():
            Line((23.25, 10.085), (23.25, 11.335))
            Line((23.25, 11.335), (22, 11.335))
            ThreePointArc((22, 11.335), (22.883883476, 10.968883476), (23.25, 10.085))
        make_face()
        with BuildLine():
            Line((23.25, 8.835), (23.25, 10.085))
            ThreePointArc((23.25, 10.085), (22.883883476, 9.201116524), (22, 8.835))
            Line((22, 8.835), (23.25, 8.835))
        make_face()
        with BuildLine():
            Line((20.75, 8.835), (22, 8.835))
            ThreePointArc((22, 8.835), (21.116116524, 9.201116524), (20.75, 10.085))
            Line((20.75, 10.085), (20.75, 8.835))
        make_face()
    cut_extrude5 = extrude(amount=CUT_EXTRUDE5_DEPTH, mode=Mode.SUBTRACT)

    # Cut-Extrude6 outline → Cut-Extrude6 (cut)
    with BuildSketch(Plane.XY.offset(CUT_EXTRUDE6_START)):
        with BuildLine():
            Line((-20.75, 11.335), (-20.75, 11.834285568))
            ThreePointArc((-20.75, 11.834285568), (-22, 12.235), (-23.25, 11.834285568))
            Line((-23.25, 11.834285568), (-23.25, 11.335))
            Line((-23.25, 11.335), (-20.75, 11.335))
        make_face()
        with BuildLine():
            ThreePointArc((-23.25, 8.335714432), (-22, 7.935), (-20.75, 8.335714432))
            Line((-20.75, 8.335714432), (-20.75, 8.835))
            Line((-20.75, 8.835), (-23.25, 8.835))
            Line((-23.25, 8.835), (-23.25, 8.335714432))
        make_face()
    cut_extrude6 = extrude(amount=CUT_EXTRUDE6_DEPTH, mode=Mode.SUBTRACT)

    # Mirror12: Cut-Extrude5, Cut-Extrude6, Cut-Extrude6 across plane
    add(cut_extrude5.mirror(Plane(origin=(0, 0, 0), x_dir=(0, 0, 1), z_dir=(1, 0, 0))), mode=Mode.SUBTRACT)
    add(cut_extrude6.mirror(Plane(origin=(0, 0, 0), x_dir=(0, 0, 1), z_dir=(1, 0, 0))), mode=Mode.SUBTRACT)
    add(cut_extrude6.mirror(Plane(origin=(0, 0, 0), x_dir=(0, 0, 1), z_dir=(1, 0, 0))), mode=Mode.SUBTRACT)

    # Sketch13 → Cut-Extrude7 (cut)
    with BuildSketch(Plane(origin=(0, 0, 136.613004813), x_dir=(-1, 0, 0), z_dir=(0, 0, -1))):
        with Locations((-10.875, 14.665)):
            Rectangle(SKETCH13_W, SKETCH13_H)
        with Locations((-10.875, 5.5)):
            Rectangle(SKETCH13_W, SKETCH13_H)
        with Locations((-3.625, 5.5)):
            Rectangle(SKETCH13_W, SKETCH13_H)
        with Locations((-3.625, 14.665)):
            Rectangle(SKETCH13_W, SKETCH13_H)
        with Locations((3.625, 14.665)):
            Rectangle(SKETCH13_W, SKETCH13_H)
        with Locations((10.875, 14.665)):
            Rectangle(SKETCH13_W, SKETCH13_H)
        with Locations((10.875, 5.5)):
            Rectangle(SKETCH13_W, SKETCH13_H)
        with Locations((3.625, 5.5)):
            Rectangle(SKETCH13_W, SKETCH13_H)
    extrude(amount=CUT_EXTRUDE7_DEPTH, mode=Mode.SUBTRACT)


with BuildPart() as body_2_1:
    add(body_2.part)

    # Cut-Extrude2: cut by cut_extrude2_tool
    add(cut_extrude2_tool.part, mode=Mode.SUBTRACT)


with BuildPart() as body_3:
    # Sketch6 → Revolve3 (revolve)
    with BuildSketch(Plane(origin=(0, 10.085, 0), x_dir=(1, 0, 0), z_dir=(0, 1, 0)), mode=Mode.PRIVATE) as revolve3_sk:
        Polygon((-20.5, -138.733883125), (-19.4, -138.733883125), (-19, -139.133883125), (-19, -141.733883125), (-18, -143.733883125), (-20.5, -143.733883125), align=None)
    revolve(revolve3_sk.sketch.rotate(Axis((-22, 10.085, 109.761224365), (0, 0, 1)), 180), axis=Axis((-22, 10.085, 109.761224365), (0, 0, 1)))


with BuildPart() as body_4:
    # Mirror11: mirrored copy
    add(body_3.part.mirror(Plane(origin=(0, 0, 0), x_dir=(0, 0, 1), z_dir=(1, 0, 0))))


solid = Compound([part_1.part, body_2_1.part, body_3.part, body_4.part])
